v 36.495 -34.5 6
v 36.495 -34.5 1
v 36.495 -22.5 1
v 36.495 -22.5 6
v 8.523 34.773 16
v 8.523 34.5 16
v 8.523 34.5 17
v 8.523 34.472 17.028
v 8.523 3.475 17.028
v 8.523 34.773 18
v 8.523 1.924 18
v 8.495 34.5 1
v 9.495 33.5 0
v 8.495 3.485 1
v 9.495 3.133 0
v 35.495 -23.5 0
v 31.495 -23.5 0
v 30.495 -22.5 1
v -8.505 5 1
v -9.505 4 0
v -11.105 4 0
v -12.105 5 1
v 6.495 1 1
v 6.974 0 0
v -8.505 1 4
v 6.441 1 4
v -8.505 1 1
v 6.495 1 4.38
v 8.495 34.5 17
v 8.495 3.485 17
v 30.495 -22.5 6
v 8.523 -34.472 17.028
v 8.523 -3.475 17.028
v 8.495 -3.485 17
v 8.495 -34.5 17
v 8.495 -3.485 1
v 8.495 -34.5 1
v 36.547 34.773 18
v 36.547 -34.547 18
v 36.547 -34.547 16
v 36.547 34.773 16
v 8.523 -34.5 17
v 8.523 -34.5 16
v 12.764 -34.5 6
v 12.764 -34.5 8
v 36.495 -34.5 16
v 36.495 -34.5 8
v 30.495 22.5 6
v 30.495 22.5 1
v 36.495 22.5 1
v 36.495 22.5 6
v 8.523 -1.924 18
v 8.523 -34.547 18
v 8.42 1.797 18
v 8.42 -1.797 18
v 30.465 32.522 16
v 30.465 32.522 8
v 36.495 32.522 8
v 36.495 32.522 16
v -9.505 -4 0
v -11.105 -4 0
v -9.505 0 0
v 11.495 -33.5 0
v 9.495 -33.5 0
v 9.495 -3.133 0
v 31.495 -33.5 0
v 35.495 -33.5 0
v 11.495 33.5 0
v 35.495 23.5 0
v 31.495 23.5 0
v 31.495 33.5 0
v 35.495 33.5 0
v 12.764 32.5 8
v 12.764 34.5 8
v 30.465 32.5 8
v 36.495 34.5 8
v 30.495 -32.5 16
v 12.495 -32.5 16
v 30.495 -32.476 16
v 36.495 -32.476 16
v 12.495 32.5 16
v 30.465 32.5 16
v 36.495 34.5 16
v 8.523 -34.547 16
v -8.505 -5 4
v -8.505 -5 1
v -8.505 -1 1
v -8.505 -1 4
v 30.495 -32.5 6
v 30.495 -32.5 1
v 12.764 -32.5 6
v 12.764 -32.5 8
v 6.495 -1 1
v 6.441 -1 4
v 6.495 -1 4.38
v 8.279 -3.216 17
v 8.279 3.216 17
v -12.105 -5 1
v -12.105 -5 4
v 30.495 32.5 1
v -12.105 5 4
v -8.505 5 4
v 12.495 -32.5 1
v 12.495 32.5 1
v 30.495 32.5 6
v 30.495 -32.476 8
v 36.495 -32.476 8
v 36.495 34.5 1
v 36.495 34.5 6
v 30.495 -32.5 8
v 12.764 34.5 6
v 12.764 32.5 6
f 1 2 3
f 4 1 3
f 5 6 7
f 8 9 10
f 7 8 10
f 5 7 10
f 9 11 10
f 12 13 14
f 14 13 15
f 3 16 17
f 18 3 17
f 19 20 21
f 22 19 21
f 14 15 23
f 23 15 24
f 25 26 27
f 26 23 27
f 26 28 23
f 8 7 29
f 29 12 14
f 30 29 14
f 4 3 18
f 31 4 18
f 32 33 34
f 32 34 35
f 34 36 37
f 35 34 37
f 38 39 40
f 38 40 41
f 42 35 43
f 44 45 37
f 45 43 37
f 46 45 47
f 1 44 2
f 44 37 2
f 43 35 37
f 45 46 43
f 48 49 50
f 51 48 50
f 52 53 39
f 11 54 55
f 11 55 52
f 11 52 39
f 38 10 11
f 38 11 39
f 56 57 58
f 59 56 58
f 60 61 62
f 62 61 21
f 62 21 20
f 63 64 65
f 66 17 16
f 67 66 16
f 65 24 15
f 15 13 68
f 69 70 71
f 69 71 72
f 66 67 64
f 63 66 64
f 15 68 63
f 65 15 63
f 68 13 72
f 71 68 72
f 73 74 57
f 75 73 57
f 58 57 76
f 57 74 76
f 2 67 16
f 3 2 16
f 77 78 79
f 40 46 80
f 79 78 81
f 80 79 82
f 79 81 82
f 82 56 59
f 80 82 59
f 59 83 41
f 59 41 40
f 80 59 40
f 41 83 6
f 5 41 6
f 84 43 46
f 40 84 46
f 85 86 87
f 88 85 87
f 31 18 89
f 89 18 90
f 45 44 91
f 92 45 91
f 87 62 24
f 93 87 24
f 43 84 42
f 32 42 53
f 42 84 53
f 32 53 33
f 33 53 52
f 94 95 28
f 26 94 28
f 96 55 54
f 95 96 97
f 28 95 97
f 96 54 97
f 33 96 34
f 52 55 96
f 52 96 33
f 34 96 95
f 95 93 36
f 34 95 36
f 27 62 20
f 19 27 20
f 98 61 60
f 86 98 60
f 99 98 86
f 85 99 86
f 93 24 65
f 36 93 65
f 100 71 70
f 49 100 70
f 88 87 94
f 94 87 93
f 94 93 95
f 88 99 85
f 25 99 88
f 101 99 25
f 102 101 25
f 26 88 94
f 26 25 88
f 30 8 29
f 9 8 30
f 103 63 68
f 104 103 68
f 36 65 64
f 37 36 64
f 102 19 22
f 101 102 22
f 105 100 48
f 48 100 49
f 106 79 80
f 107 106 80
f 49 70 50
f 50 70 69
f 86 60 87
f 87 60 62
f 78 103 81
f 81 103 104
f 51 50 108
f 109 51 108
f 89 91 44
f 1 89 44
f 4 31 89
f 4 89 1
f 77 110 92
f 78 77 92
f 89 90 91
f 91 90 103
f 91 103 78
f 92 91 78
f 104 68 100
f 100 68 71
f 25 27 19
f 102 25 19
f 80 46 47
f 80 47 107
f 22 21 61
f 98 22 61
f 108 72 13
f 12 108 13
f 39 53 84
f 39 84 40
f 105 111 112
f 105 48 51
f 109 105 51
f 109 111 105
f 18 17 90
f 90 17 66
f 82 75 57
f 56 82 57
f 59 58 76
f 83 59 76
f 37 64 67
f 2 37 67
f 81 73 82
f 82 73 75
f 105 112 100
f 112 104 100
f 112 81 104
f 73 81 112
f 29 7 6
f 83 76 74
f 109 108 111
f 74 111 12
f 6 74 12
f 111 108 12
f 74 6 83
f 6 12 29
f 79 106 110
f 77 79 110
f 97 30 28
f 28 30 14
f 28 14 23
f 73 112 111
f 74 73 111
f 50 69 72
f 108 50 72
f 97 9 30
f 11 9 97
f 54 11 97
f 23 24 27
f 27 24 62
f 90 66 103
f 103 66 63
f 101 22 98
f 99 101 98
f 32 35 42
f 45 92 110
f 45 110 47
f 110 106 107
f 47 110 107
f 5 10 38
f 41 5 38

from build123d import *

# Parameters (mm, degrees)
F1_DEPTH  = 18
F2_SIZE   = 0.99999
F4_W      = 49.3712280877
F4_H      = 16.5352197364
F6_W      = 25.0472677872
F6_H      = 14.5927555859
F8_W      = 28.0247684568
F8_H      = 69.3199932575
F9_DEPTH  = 2
F11_W     = 7.2507392615
F11_H     = 64.9974308908
F12_DEPTH = 10
F13_W     = 37.7304842696
F13_H     = 75.3901228309
F14_DEPTH = 2


# Not quite as in the source:
# - a fillet or chamfer is up to 0.001 mm smaller than in the source, because OpenCascade refuses the exact size


with BuildPart() as f1:
    # F0 (on Top) → F1 (new body)
    with BuildSketch(Plane.XY):
        Polygon((-8.5048572017, 5), (-12.1048572017, 5), (-12.1048572017, 0), (-12.1048572017, -5), (-8.5048572017, -5), (-8.5048572017, -1), (6.4951427983, -1), (8.4951427983, -3.4849380649), (8.4951427983, -34.5), (36.4951427983, -34.5), (36.4951427983, -22.5), (30.4951427983, -22.5), (30.4951427983, -32.5), (12.4951427983, -32.5), (12.4951427983, 0), (12.4951427983, 32.5), (30.4951427983, 32.5), (30.4951427983, 22.5), (36.4951427983, 22.5), (36.4951427983, 34.5), (8.4951427983, 34.5), (8.4951427983, 3.4849380649), (6.4951427983, 1), (-8.5048572017, 1), align=None)
    extrude(amount=F1_DEPTH)

    # F2 (size 1 in the source; OpenCascade refuses exactly that, so slightly less here)
    f2_edges = [f1.edges().sort_by_distance(p)[0] for p in [
        (-10.304857, 5, 18),
        (-12.104857, 0, 18),
        (-10.304857, -5, 18),
        (-8.504857, -3, 18),
        (-1.004857, -1, 18),
        (7.495143, -2.242469, 18),
        (8.495143, -18.992469, 18),
        (22.495143, -34.5, 18),
        (36.495143, -28.5, 18),
        (33.495143, -22.5, 18),
        (30.495143, -27.5, 18),
        (21.495143, -32.5, 18),
        (12.495143, 0, 18),
        (21.495143, 32.5, 18),
        (30.495143, 27.5, 18),
        (33.495143, 22.5, 18),
        (36.495143, 28.5, 18),
        (22.495143, 34.5, 18),
        (8.495143, 18.992469, 18),
        (7.495143, 2.242469, 18),
        (-1.004857, 1, 18),
        (-8.504857, 3, 18),
        (-10.304857, 5, 0),
        (-12.104857, 0, 0),
        (-10.304857, -5, 0),
        (-8.504857, -3, 0),
        (-1.004857, -1, 0),
        (7.495143, -2.242469, 0),
        (8.495143, -18.992469, 0),
        (22.495143, -34.5, 0),
        (36.495143, -28.5, 0),
        (33.495143, -22.5, 0),
        (30.495143, -27.5, 0),
        (21.495143, -32.5, 0),
        (12.495143, 0, 0),
        (21.495143, 32.5, 0),
        (30.495143, 27.5, 0),
        (33.495143, 22.5, 0),
        (36.495143, 28.5, 0),
        (22.495143, 34.5, 0),
        (8.495143, 18.992469, 0),
        (7.495143, 2.242469, 0),
        (-1.004857, 1, 0),
        (-8.504857, 3, 0),
    ]]
    chamfer(f2_edges, length=F2_SIZE)

    # F4 (on offset) → F7 section 0
    with BuildSketch(Plane.XY.offset(4)):
        with Locations((-18.2442103978, -0.0910270028)):
            Rectangle(F4_W, F4_H)
    # F6 (on offset) → F7 section 1
    with BuildSketch(Plane.XY.offset(18)):
        with Locations((-4.1036796756, 0.1169494353)):
            Rectangle(F6_W, F6_H)
    loft(mode=Mode.SUBTRACT)

    # F8 (on offset) → F9 (join)
    with BuildSketch(Plane.XY.offset(18)):
        with Locations((22.5351126865, 0.1127310097)):
            Rectangle(F8_W, F8_H)
    extrude(amount=-F9_DEPTH)

    # F11 (on offset) → F12 (cut)
    with BuildSketch(Plane.XY.offset(6)):
        with Locations((34.090702422, 0.0231582671)):
            Rectangle(F11_W, F11_H)
    extrude(amount=F12_DEPTH, mode=Mode.SUBTRACT)

    # F13 (on offset) → F14 (cut)
    with BuildSketch(Plane.XY.offset(6)):
        with Locations((31.6290971823, -0.1884736121)):
            Rectangle(F13_W, F13_H)
    extrude(amount=F14_DEPTH, mode=Mode.SUBTRACT)


solid = f1.part
